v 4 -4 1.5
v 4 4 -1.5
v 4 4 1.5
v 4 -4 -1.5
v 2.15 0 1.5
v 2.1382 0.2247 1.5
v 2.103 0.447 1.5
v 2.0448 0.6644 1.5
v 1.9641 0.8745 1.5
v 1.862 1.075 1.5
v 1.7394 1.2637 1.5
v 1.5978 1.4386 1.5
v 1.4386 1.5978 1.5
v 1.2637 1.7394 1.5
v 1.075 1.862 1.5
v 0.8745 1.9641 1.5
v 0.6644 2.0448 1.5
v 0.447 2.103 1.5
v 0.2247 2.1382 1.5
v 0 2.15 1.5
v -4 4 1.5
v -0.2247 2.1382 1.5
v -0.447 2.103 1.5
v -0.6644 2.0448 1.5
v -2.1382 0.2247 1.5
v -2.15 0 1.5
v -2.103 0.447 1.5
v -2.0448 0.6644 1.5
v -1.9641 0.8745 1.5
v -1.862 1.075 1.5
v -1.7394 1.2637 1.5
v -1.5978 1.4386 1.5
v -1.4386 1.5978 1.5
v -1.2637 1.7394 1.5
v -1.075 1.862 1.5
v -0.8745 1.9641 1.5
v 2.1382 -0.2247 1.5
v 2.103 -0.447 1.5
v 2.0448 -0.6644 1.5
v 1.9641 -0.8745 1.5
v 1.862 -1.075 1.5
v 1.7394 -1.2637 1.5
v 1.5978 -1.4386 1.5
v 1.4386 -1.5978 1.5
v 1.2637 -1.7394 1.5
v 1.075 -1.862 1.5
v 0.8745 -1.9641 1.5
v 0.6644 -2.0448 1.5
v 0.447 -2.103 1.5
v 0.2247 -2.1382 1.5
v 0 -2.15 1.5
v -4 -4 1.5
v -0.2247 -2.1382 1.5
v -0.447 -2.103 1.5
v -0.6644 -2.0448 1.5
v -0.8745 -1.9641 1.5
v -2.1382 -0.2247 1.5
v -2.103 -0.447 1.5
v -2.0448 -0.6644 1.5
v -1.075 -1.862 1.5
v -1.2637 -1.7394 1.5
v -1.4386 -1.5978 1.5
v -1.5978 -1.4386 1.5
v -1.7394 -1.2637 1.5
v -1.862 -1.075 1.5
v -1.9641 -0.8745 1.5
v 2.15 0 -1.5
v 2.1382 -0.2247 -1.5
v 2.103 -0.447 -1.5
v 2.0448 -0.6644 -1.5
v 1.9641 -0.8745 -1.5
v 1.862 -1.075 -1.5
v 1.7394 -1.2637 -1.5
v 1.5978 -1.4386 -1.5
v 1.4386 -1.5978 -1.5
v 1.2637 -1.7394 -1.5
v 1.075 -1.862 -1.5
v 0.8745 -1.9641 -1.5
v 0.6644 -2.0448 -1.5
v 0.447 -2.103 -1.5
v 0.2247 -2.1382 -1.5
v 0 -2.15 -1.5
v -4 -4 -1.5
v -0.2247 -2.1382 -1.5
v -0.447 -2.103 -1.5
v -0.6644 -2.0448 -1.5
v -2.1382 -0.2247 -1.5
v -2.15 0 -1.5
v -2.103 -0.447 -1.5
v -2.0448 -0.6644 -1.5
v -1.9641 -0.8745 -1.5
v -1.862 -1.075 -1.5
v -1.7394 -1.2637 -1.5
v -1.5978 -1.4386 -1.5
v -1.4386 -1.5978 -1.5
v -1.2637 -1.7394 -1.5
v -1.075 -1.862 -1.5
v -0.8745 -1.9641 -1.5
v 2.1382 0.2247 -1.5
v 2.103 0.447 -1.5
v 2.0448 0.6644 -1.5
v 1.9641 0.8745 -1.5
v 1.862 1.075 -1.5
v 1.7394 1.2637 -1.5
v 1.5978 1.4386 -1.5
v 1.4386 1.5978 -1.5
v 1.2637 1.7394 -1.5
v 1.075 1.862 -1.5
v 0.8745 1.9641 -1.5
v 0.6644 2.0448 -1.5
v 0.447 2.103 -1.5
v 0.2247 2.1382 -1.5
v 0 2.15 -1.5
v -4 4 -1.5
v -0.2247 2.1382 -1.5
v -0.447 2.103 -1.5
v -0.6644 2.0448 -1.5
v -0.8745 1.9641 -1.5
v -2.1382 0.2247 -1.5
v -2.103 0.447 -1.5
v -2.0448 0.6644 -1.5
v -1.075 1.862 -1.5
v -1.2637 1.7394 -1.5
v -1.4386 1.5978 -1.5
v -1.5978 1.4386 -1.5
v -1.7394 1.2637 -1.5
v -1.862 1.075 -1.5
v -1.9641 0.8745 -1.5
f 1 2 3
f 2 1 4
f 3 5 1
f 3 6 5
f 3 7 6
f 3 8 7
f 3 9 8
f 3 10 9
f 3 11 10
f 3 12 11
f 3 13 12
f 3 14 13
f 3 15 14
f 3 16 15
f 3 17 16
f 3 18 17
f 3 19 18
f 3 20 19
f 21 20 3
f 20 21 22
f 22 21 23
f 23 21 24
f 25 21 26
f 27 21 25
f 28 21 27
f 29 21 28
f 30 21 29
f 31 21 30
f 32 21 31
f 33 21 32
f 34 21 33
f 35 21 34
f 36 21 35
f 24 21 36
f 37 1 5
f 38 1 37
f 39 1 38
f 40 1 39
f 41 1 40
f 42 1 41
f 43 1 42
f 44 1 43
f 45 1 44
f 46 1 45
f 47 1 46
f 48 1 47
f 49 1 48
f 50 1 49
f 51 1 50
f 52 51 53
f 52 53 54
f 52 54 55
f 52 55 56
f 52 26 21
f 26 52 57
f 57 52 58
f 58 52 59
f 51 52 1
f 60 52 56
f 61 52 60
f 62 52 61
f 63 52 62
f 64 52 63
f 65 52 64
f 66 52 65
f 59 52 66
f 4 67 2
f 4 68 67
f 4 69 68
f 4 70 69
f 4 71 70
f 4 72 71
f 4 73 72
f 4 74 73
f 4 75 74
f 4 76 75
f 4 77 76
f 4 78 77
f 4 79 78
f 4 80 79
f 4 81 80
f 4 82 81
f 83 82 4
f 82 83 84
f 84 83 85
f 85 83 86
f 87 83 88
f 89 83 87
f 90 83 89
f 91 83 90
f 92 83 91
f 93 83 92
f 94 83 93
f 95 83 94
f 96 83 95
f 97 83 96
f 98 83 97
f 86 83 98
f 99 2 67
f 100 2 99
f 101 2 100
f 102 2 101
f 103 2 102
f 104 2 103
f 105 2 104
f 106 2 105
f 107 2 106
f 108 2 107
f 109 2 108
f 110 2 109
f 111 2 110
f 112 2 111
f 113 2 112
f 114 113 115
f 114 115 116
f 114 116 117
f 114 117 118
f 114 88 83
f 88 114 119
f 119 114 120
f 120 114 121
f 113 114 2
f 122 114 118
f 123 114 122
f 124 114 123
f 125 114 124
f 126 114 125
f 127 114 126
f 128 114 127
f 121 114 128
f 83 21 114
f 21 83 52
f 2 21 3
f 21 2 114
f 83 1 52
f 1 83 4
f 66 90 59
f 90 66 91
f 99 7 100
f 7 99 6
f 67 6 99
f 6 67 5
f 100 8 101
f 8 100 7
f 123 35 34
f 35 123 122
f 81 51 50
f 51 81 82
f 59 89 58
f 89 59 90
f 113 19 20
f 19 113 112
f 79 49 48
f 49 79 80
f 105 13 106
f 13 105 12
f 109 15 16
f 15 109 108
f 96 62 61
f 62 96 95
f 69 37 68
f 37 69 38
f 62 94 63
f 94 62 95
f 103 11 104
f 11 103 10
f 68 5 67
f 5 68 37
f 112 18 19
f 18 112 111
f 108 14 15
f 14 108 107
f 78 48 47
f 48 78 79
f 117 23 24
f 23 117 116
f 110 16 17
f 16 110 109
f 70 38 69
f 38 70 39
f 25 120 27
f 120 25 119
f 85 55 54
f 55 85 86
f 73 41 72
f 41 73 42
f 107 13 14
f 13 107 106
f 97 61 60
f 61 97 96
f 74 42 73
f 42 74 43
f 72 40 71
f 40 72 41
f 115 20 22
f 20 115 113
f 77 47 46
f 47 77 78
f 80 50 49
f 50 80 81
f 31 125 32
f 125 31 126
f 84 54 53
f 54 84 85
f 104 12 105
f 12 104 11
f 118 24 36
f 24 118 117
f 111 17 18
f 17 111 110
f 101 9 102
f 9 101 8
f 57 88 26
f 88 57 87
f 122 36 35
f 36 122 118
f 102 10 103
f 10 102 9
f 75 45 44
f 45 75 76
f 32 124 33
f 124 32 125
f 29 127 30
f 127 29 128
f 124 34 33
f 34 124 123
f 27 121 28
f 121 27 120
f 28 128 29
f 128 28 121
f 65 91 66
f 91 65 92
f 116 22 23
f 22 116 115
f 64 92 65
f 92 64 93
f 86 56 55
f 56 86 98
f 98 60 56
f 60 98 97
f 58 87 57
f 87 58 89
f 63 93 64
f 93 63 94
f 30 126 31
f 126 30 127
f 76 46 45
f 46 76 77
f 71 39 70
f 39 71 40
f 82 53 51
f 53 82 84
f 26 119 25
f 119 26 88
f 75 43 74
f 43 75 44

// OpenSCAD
// Square nut.
$fn = 60;
eps = 0.02;
thread_d = 4.3;
side = 8;
thickness = 3;
difference() {
    cube([side, side, thickness], center = true);
    translate([0, 0, -thickness / 2 - eps]) cylinder(d = thread_d, h = thickness + 2 * eps);
}
